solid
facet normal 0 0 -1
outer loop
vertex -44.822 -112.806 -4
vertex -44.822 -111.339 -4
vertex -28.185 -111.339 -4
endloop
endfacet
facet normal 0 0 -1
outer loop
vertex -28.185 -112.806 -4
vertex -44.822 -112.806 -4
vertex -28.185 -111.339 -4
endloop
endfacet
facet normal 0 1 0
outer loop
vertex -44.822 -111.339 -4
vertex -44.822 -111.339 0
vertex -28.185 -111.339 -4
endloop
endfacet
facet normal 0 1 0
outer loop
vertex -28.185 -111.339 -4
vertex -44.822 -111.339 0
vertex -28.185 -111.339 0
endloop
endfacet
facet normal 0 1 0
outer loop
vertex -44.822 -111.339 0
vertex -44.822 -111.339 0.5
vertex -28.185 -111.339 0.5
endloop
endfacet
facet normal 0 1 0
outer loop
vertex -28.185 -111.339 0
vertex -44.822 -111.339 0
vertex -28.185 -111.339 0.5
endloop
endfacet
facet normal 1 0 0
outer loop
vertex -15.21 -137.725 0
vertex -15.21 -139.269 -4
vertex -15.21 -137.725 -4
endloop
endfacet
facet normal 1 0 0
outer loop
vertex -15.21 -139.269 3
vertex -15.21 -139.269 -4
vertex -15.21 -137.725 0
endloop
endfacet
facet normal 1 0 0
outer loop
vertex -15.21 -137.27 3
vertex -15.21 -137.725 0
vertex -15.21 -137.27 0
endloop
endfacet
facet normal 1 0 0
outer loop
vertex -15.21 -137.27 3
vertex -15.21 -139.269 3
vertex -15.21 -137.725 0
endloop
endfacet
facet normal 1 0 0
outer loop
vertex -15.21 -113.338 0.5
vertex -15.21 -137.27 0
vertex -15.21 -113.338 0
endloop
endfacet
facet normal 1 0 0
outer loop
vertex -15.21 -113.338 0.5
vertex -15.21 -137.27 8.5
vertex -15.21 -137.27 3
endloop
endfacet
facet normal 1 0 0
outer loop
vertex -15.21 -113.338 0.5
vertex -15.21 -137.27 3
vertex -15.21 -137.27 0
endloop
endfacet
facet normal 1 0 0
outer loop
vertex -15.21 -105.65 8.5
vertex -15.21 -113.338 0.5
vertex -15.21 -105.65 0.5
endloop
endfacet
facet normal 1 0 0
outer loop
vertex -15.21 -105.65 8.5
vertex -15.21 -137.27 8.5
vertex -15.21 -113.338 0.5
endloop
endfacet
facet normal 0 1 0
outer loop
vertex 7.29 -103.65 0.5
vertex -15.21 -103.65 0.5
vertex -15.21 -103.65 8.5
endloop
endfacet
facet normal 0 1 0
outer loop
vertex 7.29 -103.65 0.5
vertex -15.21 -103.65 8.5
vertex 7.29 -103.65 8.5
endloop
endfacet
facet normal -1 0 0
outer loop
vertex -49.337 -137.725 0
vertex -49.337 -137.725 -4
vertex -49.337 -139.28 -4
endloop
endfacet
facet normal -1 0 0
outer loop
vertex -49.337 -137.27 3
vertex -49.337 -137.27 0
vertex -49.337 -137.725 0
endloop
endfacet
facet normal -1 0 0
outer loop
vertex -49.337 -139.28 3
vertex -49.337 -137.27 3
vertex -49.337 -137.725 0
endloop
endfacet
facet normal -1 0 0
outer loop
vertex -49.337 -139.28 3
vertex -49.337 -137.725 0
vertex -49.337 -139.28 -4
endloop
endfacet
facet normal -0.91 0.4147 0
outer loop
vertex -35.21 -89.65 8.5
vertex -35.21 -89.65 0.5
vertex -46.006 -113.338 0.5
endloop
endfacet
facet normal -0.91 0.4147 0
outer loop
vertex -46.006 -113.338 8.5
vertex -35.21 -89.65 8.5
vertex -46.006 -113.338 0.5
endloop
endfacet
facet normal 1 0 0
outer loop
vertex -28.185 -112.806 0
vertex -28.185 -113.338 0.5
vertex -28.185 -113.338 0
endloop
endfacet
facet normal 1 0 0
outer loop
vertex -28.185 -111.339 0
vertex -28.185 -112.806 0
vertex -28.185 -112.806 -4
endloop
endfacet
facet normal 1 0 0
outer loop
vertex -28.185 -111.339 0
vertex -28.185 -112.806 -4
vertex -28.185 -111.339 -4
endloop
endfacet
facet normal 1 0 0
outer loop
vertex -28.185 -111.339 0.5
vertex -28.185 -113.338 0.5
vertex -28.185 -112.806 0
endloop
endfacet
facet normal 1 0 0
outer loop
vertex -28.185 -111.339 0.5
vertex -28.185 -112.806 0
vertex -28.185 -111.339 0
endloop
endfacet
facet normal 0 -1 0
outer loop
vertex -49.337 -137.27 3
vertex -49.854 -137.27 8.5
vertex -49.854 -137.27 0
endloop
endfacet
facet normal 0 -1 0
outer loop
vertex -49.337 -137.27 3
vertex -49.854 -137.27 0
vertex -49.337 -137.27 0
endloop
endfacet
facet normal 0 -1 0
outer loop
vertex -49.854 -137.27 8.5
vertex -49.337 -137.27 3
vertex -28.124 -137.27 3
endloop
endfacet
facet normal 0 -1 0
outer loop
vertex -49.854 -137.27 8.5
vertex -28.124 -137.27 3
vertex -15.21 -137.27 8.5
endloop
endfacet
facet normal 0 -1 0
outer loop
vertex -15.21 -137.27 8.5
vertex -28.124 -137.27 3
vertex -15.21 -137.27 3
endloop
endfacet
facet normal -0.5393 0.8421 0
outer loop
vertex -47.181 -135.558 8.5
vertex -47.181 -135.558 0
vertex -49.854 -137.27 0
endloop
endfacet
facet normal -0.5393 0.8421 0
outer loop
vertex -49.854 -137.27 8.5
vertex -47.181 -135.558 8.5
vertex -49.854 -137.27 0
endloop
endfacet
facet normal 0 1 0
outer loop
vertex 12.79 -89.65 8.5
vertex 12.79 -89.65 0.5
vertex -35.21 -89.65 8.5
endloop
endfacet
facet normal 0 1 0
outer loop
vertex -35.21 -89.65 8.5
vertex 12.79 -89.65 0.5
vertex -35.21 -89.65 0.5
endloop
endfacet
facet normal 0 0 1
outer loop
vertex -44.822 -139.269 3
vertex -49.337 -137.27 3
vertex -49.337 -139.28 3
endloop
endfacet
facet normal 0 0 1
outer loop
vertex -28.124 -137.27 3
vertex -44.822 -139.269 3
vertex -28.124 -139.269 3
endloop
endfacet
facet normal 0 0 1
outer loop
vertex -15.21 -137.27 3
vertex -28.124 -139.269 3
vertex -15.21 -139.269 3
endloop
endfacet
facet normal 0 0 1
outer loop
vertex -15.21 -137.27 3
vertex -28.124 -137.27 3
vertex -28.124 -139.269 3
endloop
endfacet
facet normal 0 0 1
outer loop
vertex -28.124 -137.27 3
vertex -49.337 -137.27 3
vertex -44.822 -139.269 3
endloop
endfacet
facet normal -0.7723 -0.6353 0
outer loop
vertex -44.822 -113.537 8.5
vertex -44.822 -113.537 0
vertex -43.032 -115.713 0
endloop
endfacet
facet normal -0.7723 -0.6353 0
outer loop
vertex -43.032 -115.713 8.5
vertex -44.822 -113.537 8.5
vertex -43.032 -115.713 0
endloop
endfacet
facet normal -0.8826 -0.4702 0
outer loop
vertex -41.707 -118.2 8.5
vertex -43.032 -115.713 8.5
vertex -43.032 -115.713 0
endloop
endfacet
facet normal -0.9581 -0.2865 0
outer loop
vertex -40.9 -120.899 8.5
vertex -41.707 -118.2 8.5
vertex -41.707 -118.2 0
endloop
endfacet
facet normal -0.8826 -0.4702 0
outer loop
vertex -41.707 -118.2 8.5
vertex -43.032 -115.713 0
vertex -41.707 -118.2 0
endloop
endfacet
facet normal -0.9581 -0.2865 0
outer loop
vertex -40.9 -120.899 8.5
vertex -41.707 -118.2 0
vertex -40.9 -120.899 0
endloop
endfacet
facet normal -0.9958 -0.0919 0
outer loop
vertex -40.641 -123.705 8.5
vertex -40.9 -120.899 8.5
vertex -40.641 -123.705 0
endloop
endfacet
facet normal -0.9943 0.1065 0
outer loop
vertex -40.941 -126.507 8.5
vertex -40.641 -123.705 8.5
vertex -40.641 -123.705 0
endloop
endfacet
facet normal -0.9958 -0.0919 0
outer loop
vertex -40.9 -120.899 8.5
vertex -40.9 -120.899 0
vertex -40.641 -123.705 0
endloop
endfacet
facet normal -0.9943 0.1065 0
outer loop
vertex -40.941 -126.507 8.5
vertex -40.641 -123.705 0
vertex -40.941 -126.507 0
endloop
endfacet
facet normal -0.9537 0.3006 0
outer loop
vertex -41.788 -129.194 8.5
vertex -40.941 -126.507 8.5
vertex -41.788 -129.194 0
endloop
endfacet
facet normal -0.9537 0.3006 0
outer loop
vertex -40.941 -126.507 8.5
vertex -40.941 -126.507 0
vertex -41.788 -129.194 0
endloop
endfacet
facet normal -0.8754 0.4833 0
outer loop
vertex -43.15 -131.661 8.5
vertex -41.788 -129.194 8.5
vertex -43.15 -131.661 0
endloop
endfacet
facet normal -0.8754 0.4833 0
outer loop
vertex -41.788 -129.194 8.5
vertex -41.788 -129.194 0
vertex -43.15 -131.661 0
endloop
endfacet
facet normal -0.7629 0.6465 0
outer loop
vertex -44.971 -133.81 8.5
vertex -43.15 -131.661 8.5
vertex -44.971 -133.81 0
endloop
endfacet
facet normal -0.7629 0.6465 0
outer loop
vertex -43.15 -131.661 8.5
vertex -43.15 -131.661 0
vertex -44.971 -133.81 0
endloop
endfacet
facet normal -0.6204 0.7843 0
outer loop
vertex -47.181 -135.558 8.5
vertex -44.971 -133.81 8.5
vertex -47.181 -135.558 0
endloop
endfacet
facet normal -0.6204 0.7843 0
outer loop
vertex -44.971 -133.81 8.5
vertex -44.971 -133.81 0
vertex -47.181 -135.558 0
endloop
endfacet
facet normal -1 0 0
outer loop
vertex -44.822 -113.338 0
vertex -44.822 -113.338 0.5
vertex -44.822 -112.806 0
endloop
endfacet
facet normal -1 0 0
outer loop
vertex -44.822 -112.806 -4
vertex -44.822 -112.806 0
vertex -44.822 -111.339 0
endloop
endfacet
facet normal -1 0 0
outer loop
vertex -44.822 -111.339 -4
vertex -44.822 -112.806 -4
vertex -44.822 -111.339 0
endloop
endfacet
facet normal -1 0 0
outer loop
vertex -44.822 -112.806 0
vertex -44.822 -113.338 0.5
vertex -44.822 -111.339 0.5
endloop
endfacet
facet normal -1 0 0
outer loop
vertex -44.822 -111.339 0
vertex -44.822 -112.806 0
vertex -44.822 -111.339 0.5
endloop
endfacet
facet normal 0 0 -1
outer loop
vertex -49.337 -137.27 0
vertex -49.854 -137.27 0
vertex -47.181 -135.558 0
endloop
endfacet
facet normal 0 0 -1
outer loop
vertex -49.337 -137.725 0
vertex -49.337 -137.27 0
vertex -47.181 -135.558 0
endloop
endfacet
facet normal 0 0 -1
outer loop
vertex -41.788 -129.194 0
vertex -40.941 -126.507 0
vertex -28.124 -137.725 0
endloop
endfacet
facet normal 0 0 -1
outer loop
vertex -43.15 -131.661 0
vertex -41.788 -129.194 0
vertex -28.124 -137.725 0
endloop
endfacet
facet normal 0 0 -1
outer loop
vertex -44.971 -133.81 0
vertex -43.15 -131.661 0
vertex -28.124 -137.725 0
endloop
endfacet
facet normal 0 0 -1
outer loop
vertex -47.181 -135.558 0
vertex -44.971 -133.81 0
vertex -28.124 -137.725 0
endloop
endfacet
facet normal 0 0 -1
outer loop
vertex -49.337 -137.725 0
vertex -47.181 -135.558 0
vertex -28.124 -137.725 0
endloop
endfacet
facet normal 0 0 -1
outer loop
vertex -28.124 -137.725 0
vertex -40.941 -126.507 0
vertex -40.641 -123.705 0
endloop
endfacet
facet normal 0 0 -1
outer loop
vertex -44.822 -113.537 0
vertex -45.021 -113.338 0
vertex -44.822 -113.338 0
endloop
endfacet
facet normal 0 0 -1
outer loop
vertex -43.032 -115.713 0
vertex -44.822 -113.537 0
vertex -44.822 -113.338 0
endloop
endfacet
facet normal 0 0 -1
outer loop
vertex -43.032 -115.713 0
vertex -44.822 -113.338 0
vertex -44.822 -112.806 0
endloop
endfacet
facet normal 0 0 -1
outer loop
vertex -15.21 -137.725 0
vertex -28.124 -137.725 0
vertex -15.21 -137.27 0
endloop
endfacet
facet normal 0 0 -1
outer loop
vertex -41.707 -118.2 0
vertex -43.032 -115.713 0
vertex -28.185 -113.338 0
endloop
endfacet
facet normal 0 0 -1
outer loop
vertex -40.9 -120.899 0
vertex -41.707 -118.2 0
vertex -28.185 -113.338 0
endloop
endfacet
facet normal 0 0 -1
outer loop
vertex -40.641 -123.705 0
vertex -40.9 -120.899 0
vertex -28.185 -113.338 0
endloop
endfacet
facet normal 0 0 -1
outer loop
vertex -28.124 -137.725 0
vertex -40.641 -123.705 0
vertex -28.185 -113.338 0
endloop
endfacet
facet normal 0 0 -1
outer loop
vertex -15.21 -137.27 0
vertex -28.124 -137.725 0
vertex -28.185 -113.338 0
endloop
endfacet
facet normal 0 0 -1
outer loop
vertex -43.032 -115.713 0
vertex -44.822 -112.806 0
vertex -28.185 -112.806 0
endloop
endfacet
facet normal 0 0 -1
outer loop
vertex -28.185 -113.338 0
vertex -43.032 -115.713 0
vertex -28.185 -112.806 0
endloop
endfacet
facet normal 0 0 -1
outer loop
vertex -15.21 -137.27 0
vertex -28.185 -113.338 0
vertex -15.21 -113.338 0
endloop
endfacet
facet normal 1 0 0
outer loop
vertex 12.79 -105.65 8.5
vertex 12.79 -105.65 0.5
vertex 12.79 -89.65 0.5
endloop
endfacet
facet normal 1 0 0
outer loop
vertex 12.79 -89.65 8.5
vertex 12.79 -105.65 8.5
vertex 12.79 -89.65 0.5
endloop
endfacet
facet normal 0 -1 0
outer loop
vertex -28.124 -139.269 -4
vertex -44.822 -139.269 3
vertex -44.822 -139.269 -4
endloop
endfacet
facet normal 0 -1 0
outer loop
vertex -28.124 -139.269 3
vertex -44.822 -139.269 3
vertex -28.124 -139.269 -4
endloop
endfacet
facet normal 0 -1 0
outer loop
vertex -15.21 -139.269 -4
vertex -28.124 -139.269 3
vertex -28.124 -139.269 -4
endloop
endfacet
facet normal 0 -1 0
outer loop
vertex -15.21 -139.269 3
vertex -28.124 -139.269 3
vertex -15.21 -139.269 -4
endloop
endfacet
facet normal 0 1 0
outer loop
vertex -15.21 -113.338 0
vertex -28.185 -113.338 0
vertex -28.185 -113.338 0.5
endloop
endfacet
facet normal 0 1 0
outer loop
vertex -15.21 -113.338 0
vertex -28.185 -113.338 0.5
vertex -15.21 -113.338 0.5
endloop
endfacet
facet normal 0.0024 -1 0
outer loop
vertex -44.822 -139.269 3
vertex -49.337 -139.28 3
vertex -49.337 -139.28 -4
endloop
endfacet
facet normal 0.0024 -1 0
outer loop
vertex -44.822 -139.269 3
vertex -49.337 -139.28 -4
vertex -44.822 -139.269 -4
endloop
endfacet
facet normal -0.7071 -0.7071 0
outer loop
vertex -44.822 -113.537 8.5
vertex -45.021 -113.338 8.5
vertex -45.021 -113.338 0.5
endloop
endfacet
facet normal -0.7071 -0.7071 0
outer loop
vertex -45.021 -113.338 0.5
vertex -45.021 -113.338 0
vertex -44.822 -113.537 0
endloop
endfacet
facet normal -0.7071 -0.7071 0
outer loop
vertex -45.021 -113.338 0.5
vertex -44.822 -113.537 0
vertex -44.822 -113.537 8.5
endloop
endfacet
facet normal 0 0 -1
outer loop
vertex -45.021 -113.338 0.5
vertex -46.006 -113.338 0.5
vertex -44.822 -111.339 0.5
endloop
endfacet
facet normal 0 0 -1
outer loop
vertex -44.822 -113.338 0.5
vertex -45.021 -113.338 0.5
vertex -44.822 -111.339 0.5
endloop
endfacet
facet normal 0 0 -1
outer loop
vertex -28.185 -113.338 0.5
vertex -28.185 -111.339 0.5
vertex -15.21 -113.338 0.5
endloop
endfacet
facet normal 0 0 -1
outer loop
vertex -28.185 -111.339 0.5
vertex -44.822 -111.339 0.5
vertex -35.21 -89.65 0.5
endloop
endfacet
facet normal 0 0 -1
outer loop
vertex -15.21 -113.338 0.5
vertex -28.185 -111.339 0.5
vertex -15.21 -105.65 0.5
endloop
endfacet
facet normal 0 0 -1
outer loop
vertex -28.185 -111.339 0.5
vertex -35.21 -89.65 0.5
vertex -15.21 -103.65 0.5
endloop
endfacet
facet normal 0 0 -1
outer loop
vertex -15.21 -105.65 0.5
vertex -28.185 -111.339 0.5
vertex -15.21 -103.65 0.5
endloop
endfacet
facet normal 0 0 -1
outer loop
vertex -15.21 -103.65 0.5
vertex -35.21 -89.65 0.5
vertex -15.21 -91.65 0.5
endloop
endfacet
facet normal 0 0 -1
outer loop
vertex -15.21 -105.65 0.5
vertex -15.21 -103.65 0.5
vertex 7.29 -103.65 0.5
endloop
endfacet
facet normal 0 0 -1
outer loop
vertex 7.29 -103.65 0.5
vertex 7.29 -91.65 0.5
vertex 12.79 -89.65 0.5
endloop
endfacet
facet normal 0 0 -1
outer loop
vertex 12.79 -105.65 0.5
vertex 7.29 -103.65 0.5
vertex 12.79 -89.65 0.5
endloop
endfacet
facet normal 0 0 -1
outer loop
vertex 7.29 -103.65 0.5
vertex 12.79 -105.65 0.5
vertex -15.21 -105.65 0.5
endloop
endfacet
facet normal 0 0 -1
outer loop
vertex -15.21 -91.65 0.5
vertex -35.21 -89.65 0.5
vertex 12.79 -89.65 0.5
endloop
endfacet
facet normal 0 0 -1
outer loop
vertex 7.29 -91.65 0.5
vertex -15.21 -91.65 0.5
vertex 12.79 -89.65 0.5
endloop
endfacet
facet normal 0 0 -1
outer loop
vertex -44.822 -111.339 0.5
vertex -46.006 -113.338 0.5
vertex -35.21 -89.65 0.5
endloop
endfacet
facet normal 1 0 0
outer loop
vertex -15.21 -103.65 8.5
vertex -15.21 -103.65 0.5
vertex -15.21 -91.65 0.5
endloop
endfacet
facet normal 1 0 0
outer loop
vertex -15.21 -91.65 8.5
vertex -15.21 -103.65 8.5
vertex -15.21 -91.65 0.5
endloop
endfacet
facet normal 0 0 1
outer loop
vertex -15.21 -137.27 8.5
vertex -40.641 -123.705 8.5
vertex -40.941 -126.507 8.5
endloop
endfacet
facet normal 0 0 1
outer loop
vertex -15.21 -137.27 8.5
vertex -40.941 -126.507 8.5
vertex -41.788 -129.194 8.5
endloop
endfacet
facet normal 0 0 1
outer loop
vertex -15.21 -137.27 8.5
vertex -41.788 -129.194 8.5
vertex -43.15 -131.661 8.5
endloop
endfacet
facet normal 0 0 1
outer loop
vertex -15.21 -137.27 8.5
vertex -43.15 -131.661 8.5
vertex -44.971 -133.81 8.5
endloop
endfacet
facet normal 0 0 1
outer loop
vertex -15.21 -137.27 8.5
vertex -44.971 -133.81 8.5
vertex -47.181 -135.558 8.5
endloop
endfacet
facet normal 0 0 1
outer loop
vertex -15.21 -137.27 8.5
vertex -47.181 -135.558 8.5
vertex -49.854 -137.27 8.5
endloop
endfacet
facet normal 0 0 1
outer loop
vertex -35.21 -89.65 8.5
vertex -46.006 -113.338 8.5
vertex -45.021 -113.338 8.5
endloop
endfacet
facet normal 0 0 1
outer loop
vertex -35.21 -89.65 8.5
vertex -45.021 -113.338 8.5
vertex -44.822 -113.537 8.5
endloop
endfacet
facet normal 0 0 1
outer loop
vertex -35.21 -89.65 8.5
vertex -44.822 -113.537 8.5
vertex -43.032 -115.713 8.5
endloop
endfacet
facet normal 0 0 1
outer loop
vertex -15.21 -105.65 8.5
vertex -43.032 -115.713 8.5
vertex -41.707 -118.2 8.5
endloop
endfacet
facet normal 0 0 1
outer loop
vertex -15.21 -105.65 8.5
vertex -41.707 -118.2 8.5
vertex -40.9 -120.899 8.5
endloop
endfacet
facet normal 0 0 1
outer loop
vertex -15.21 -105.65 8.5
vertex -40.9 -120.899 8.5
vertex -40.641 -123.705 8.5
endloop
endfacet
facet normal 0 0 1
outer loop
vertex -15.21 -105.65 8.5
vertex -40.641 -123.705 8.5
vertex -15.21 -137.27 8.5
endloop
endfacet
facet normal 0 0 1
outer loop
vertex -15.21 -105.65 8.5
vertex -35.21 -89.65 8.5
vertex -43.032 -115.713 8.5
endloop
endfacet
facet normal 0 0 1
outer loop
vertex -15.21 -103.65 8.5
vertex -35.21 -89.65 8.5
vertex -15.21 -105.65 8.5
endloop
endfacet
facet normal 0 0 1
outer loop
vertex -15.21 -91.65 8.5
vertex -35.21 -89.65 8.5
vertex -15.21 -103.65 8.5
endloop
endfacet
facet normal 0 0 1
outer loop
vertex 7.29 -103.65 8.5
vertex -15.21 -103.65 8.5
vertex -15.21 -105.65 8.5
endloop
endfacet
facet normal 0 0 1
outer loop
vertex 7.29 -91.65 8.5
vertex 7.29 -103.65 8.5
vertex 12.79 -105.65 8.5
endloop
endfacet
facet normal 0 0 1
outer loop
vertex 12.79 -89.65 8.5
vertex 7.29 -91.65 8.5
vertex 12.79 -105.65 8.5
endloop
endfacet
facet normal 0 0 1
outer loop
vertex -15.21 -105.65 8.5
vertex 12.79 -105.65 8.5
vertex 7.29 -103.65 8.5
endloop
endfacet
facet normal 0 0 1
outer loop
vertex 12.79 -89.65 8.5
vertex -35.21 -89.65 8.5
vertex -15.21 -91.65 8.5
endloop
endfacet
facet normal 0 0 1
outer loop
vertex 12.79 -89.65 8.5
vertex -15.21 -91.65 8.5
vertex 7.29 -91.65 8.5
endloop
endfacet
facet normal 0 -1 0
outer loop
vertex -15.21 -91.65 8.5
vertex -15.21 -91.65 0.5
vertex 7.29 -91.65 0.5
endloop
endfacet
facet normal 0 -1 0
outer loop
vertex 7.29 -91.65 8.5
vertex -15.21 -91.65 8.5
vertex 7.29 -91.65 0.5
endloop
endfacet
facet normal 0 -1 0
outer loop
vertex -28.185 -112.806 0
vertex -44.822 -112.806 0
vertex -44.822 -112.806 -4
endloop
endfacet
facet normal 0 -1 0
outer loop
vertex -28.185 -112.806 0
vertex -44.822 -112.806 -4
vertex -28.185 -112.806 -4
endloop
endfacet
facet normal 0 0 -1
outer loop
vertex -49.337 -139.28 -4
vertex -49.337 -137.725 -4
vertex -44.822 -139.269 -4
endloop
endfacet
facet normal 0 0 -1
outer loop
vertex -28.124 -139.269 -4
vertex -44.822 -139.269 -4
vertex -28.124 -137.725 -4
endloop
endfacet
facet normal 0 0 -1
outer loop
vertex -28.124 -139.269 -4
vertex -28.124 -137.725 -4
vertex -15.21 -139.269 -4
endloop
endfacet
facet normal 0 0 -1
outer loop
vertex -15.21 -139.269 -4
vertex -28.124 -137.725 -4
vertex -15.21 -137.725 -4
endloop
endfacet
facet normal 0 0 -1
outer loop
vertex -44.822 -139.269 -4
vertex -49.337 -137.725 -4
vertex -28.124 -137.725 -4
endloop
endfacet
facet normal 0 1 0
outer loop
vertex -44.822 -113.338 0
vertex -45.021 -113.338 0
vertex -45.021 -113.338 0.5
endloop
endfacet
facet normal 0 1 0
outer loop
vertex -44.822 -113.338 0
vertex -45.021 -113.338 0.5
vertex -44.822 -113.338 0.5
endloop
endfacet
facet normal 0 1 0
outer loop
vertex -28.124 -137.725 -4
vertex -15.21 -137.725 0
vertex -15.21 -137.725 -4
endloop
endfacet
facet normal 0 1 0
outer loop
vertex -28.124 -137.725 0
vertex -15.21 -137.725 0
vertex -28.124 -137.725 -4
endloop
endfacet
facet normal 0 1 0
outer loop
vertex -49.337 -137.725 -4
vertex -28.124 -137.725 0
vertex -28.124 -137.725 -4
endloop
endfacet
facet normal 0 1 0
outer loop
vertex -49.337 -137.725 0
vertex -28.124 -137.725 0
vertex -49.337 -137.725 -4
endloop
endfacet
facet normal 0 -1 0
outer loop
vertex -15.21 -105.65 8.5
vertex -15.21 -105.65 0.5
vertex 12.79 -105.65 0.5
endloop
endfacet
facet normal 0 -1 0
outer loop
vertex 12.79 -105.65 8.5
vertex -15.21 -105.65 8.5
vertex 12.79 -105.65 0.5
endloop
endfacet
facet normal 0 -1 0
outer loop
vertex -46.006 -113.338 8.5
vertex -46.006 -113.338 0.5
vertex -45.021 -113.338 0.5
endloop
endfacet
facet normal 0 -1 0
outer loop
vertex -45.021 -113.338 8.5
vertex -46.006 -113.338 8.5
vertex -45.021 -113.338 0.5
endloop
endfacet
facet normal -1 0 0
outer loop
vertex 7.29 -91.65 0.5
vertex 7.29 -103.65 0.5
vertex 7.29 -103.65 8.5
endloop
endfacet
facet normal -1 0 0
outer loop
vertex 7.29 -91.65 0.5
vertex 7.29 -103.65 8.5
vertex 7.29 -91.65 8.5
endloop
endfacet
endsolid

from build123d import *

# Parameters (mm, degrees)
F0_W     = 22.5
F0_H     = 12
F0_W_2   = 16.6362704164
F0_H_2   = 1.4672726393
F1_DEPTH = 8.5
F0_W_3   = 12.9140389063
F0_H_3   = 0.4558046321
F0_H_4   = 1.5437308085
F2_DEPTH = 3
F3_DEPTH = 4
F4_DEPTH = 0.5
F5_DEPTH = 0.5
F6_DEPTH = 4


# Not quite as in the source:
# - a feature names something its author has since deleted; it is built from what else it names


with BuildPart() as f1:
    # F0 (on Top) → F1 (new body)
    with BuildSketch(Plane.XY):
        Polygon((-28.1854607165, -113.3383650622), (-15.2103829287, -113.3383650622), (-15.2103829287, -112.8061022609), (-15.2103829287, -111.3388296217), (-15.2103829287, -105.6495462671), (-21.261529997, -105.6495462671), (-21.261529997, -89.6495462671), (-35.2103829287, -89.6495462671), (-46.0062867338, -113.3383650622), (-45.0214308559, -113.3383650622), (-44.8217311329, -113.3383650622), (-44.8217311329, -112.8061022609), (-44.8217311329, -111.3388296217), (-28.1854607165, -111.3388296217), (-28.1854607165, -112.8061022609), align=None)
        Polygon((-28.1244218349, -137.2695039054), (-15.2103829287, -137.2695039054), (-15.2103829287, -136.6045172354), (-15.2103829287, -114.0332519535), (-15.2103829287, -113.3383650622), (-28.1854607165, -113.3383650622), (-35.2103829287, -113.3383650622), (-35.2103829287, -125.3039344838), (-35.2103829287, -137.2695039054), align=None)
        with BuildLine():
            Line((-49.3365414441, -137.2695039054), (-35.2103829287, -137.2695039054))
            Line((-35.2103829287, -137.2695039054), (-35.2103829287, -125.3039344838))
            Line((-35.2103829287, -125.3039344838), (-35.2103829287, -113.3383650622))
            Line((-35.2103829287, -113.3383650622), (-44.8217311329, -113.3383650622))
            Line((-44.8217311329, -113.3383650622), (-44.8217311329, -113.5371806076))
            ThreePointArc((-44.8217311329, -113.5371806076), (-40.72117222, -125.1132769851), (-47.1813260123, -135.5577493852))
            Line((-47.1813260123, -135.5577493852), (-49.8537484313, -137.2695039054))
            Line((-49.8537484313, -137.2695039054), (-49.3365414441, -137.2695039054))
        make_face()
        Polygon((-21.261529997, -105.6495462671), (-15.2103829287, -105.6495462671), (7.2896170713, -105.6495462671), (12.7896170713, -105.6495462671), (12.7896170713, -91.6495462671), (12.7896170713, -89.6495462671), (-15.2103829287, -89.6495462671), (-21.261529997, -89.6495462671), align=None)
        with Locations((-3.9603829287, -97.6495462671)):
            Rectangle(F0_W, F0_H, mode=Mode.SUBTRACT)
        Polygon((-35.2103829287, -113.3383650622), (-28.1854607165, -113.3383650622), (-28.1854607165, -112.8061022609), (-44.8217311329, -112.8061022609), (-44.8217311329, -113.3383650622), align=None)
        with Locations((-36.5035959247, -112.0724659413)):
            Rectangle(F0_W_2, F0_H_2)
        Polygon((-44.8217311329, -113.5371806076), (-44.8217311329, -113.3383650622), (-45.0214308559, -113.3383650622), align=None)
    extrude(amount=F1_DEPTH)

    # F0 (on Top) → F2 (join)
    with BuildSketch(Plane.XY):
        Polygon((-28.1244218349, -137.7253085375), (-28.1244218349, -137.2695039054), (-35.2103829287, -137.2695039054), (-49.3365414441, -137.2695039054), (-49.3365414441, -137.7253085375), align=None)
        Polygon((-28.1244218349, -139.269039346), (-28.1244218349, -137.7253085375), (-49.3365414441, -137.7253085375), (-49.3365414441, -139.2803862691), (-44.8217311329, -139.269039346), align=None)
        with Locations((-21.6674023818, -137.4974062214)):
            Rectangle(F0_W_3, F0_H_3)
        with Locations((-21.6674023818, -138.4971739417)):
            Rectangle(F0_W_3, F0_H_4)
    extrude(amount=F2_DEPTH)

    # F0 (on Top) → F3 (join)
    with BuildSketch(Plane.XY):
        Polygon((-28.1244218349, -139.269039346), (-28.1244218349, -137.7253085375), (-49.3365414441, -137.7253085375), (-49.3365414441, -139.2803862691), (-44.8217311329, -139.269039346), align=None)
        with Locations((-21.6674023818, -138.4971739417)):
            Rectangle(F0_W_3, F0_H_4)
    extrude(amount=-F3_DEPTH)

    # F0 (on Top) → F4 (cut)
    with BuildSketch(Plane.XY):
        Polygon((-28.1854607165, -113.3383650622), (-15.2103829287, -113.3383650622), (-15.2103829287, -112.8061022609), (-15.2103829287, -111.3388296217), (-15.2103829287, -105.6495462671), (-21.261529997, -105.6495462671), (-21.261529997, -89.6495462671), (-35.2103829287, -89.6495462671), (-46.0062867338, -113.3383650622), (-45.0214308559, -113.3383650622), (-44.8217311329, -113.3383650622), (-44.8217311329, -112.8061022609), (-44.8217311329, -111.3388296217), (-28.1854607165, -111.3388296217), (-28.1854607165, -112.8061022609), align=None)
        Polygon((-21.261529997, -105.6495462671), (-15.2103829287, -105.6495462671), (7.2896170713, -105.6495462671), (12.7896170713, -105.6495462671), (12.7896170713, -91.6495462671), (12.7896170713, -89.6495462671), (-15.2103829287, -89.6495462671), (-21.261529997, -89.6495462671), align=None)
        with Locations((-3.9603829287, -97.6495462671)):
            Rectangle(F0_W, F0_H, mode=Mode.SUBTRACT)
    extrude(amount=F4_DEPTH, mode=Mode.SUBTRACT)

    # F0 (on Top) → F5 (join)
    with BuildSketch(Plane.XY):
        with Locations((-36.5035959247, -112.0724659413)):
            Rectangle(F0_W_2, F0_H_2)
        Polygon((-35.2103829287, -113.3383650622), (-28.1854607165, -113.3383650622), (-28.1854607165, -112.8061022609), (-44.8217311329, -112.8061022609), (-44.8217311329, -113.3383650622), align=None)
    extrude(amount=F5_DEPTH)

    # F0 (on Top) → F6 (join)
    with BuildSketch(Plane.XY):
        with Locations((-36.5035959247, -112.0724659413)):
            Rectangle(F0_W_2, F0_H_2)
    extrude(amount=-F6_DEPTH)


solid = f1.part
